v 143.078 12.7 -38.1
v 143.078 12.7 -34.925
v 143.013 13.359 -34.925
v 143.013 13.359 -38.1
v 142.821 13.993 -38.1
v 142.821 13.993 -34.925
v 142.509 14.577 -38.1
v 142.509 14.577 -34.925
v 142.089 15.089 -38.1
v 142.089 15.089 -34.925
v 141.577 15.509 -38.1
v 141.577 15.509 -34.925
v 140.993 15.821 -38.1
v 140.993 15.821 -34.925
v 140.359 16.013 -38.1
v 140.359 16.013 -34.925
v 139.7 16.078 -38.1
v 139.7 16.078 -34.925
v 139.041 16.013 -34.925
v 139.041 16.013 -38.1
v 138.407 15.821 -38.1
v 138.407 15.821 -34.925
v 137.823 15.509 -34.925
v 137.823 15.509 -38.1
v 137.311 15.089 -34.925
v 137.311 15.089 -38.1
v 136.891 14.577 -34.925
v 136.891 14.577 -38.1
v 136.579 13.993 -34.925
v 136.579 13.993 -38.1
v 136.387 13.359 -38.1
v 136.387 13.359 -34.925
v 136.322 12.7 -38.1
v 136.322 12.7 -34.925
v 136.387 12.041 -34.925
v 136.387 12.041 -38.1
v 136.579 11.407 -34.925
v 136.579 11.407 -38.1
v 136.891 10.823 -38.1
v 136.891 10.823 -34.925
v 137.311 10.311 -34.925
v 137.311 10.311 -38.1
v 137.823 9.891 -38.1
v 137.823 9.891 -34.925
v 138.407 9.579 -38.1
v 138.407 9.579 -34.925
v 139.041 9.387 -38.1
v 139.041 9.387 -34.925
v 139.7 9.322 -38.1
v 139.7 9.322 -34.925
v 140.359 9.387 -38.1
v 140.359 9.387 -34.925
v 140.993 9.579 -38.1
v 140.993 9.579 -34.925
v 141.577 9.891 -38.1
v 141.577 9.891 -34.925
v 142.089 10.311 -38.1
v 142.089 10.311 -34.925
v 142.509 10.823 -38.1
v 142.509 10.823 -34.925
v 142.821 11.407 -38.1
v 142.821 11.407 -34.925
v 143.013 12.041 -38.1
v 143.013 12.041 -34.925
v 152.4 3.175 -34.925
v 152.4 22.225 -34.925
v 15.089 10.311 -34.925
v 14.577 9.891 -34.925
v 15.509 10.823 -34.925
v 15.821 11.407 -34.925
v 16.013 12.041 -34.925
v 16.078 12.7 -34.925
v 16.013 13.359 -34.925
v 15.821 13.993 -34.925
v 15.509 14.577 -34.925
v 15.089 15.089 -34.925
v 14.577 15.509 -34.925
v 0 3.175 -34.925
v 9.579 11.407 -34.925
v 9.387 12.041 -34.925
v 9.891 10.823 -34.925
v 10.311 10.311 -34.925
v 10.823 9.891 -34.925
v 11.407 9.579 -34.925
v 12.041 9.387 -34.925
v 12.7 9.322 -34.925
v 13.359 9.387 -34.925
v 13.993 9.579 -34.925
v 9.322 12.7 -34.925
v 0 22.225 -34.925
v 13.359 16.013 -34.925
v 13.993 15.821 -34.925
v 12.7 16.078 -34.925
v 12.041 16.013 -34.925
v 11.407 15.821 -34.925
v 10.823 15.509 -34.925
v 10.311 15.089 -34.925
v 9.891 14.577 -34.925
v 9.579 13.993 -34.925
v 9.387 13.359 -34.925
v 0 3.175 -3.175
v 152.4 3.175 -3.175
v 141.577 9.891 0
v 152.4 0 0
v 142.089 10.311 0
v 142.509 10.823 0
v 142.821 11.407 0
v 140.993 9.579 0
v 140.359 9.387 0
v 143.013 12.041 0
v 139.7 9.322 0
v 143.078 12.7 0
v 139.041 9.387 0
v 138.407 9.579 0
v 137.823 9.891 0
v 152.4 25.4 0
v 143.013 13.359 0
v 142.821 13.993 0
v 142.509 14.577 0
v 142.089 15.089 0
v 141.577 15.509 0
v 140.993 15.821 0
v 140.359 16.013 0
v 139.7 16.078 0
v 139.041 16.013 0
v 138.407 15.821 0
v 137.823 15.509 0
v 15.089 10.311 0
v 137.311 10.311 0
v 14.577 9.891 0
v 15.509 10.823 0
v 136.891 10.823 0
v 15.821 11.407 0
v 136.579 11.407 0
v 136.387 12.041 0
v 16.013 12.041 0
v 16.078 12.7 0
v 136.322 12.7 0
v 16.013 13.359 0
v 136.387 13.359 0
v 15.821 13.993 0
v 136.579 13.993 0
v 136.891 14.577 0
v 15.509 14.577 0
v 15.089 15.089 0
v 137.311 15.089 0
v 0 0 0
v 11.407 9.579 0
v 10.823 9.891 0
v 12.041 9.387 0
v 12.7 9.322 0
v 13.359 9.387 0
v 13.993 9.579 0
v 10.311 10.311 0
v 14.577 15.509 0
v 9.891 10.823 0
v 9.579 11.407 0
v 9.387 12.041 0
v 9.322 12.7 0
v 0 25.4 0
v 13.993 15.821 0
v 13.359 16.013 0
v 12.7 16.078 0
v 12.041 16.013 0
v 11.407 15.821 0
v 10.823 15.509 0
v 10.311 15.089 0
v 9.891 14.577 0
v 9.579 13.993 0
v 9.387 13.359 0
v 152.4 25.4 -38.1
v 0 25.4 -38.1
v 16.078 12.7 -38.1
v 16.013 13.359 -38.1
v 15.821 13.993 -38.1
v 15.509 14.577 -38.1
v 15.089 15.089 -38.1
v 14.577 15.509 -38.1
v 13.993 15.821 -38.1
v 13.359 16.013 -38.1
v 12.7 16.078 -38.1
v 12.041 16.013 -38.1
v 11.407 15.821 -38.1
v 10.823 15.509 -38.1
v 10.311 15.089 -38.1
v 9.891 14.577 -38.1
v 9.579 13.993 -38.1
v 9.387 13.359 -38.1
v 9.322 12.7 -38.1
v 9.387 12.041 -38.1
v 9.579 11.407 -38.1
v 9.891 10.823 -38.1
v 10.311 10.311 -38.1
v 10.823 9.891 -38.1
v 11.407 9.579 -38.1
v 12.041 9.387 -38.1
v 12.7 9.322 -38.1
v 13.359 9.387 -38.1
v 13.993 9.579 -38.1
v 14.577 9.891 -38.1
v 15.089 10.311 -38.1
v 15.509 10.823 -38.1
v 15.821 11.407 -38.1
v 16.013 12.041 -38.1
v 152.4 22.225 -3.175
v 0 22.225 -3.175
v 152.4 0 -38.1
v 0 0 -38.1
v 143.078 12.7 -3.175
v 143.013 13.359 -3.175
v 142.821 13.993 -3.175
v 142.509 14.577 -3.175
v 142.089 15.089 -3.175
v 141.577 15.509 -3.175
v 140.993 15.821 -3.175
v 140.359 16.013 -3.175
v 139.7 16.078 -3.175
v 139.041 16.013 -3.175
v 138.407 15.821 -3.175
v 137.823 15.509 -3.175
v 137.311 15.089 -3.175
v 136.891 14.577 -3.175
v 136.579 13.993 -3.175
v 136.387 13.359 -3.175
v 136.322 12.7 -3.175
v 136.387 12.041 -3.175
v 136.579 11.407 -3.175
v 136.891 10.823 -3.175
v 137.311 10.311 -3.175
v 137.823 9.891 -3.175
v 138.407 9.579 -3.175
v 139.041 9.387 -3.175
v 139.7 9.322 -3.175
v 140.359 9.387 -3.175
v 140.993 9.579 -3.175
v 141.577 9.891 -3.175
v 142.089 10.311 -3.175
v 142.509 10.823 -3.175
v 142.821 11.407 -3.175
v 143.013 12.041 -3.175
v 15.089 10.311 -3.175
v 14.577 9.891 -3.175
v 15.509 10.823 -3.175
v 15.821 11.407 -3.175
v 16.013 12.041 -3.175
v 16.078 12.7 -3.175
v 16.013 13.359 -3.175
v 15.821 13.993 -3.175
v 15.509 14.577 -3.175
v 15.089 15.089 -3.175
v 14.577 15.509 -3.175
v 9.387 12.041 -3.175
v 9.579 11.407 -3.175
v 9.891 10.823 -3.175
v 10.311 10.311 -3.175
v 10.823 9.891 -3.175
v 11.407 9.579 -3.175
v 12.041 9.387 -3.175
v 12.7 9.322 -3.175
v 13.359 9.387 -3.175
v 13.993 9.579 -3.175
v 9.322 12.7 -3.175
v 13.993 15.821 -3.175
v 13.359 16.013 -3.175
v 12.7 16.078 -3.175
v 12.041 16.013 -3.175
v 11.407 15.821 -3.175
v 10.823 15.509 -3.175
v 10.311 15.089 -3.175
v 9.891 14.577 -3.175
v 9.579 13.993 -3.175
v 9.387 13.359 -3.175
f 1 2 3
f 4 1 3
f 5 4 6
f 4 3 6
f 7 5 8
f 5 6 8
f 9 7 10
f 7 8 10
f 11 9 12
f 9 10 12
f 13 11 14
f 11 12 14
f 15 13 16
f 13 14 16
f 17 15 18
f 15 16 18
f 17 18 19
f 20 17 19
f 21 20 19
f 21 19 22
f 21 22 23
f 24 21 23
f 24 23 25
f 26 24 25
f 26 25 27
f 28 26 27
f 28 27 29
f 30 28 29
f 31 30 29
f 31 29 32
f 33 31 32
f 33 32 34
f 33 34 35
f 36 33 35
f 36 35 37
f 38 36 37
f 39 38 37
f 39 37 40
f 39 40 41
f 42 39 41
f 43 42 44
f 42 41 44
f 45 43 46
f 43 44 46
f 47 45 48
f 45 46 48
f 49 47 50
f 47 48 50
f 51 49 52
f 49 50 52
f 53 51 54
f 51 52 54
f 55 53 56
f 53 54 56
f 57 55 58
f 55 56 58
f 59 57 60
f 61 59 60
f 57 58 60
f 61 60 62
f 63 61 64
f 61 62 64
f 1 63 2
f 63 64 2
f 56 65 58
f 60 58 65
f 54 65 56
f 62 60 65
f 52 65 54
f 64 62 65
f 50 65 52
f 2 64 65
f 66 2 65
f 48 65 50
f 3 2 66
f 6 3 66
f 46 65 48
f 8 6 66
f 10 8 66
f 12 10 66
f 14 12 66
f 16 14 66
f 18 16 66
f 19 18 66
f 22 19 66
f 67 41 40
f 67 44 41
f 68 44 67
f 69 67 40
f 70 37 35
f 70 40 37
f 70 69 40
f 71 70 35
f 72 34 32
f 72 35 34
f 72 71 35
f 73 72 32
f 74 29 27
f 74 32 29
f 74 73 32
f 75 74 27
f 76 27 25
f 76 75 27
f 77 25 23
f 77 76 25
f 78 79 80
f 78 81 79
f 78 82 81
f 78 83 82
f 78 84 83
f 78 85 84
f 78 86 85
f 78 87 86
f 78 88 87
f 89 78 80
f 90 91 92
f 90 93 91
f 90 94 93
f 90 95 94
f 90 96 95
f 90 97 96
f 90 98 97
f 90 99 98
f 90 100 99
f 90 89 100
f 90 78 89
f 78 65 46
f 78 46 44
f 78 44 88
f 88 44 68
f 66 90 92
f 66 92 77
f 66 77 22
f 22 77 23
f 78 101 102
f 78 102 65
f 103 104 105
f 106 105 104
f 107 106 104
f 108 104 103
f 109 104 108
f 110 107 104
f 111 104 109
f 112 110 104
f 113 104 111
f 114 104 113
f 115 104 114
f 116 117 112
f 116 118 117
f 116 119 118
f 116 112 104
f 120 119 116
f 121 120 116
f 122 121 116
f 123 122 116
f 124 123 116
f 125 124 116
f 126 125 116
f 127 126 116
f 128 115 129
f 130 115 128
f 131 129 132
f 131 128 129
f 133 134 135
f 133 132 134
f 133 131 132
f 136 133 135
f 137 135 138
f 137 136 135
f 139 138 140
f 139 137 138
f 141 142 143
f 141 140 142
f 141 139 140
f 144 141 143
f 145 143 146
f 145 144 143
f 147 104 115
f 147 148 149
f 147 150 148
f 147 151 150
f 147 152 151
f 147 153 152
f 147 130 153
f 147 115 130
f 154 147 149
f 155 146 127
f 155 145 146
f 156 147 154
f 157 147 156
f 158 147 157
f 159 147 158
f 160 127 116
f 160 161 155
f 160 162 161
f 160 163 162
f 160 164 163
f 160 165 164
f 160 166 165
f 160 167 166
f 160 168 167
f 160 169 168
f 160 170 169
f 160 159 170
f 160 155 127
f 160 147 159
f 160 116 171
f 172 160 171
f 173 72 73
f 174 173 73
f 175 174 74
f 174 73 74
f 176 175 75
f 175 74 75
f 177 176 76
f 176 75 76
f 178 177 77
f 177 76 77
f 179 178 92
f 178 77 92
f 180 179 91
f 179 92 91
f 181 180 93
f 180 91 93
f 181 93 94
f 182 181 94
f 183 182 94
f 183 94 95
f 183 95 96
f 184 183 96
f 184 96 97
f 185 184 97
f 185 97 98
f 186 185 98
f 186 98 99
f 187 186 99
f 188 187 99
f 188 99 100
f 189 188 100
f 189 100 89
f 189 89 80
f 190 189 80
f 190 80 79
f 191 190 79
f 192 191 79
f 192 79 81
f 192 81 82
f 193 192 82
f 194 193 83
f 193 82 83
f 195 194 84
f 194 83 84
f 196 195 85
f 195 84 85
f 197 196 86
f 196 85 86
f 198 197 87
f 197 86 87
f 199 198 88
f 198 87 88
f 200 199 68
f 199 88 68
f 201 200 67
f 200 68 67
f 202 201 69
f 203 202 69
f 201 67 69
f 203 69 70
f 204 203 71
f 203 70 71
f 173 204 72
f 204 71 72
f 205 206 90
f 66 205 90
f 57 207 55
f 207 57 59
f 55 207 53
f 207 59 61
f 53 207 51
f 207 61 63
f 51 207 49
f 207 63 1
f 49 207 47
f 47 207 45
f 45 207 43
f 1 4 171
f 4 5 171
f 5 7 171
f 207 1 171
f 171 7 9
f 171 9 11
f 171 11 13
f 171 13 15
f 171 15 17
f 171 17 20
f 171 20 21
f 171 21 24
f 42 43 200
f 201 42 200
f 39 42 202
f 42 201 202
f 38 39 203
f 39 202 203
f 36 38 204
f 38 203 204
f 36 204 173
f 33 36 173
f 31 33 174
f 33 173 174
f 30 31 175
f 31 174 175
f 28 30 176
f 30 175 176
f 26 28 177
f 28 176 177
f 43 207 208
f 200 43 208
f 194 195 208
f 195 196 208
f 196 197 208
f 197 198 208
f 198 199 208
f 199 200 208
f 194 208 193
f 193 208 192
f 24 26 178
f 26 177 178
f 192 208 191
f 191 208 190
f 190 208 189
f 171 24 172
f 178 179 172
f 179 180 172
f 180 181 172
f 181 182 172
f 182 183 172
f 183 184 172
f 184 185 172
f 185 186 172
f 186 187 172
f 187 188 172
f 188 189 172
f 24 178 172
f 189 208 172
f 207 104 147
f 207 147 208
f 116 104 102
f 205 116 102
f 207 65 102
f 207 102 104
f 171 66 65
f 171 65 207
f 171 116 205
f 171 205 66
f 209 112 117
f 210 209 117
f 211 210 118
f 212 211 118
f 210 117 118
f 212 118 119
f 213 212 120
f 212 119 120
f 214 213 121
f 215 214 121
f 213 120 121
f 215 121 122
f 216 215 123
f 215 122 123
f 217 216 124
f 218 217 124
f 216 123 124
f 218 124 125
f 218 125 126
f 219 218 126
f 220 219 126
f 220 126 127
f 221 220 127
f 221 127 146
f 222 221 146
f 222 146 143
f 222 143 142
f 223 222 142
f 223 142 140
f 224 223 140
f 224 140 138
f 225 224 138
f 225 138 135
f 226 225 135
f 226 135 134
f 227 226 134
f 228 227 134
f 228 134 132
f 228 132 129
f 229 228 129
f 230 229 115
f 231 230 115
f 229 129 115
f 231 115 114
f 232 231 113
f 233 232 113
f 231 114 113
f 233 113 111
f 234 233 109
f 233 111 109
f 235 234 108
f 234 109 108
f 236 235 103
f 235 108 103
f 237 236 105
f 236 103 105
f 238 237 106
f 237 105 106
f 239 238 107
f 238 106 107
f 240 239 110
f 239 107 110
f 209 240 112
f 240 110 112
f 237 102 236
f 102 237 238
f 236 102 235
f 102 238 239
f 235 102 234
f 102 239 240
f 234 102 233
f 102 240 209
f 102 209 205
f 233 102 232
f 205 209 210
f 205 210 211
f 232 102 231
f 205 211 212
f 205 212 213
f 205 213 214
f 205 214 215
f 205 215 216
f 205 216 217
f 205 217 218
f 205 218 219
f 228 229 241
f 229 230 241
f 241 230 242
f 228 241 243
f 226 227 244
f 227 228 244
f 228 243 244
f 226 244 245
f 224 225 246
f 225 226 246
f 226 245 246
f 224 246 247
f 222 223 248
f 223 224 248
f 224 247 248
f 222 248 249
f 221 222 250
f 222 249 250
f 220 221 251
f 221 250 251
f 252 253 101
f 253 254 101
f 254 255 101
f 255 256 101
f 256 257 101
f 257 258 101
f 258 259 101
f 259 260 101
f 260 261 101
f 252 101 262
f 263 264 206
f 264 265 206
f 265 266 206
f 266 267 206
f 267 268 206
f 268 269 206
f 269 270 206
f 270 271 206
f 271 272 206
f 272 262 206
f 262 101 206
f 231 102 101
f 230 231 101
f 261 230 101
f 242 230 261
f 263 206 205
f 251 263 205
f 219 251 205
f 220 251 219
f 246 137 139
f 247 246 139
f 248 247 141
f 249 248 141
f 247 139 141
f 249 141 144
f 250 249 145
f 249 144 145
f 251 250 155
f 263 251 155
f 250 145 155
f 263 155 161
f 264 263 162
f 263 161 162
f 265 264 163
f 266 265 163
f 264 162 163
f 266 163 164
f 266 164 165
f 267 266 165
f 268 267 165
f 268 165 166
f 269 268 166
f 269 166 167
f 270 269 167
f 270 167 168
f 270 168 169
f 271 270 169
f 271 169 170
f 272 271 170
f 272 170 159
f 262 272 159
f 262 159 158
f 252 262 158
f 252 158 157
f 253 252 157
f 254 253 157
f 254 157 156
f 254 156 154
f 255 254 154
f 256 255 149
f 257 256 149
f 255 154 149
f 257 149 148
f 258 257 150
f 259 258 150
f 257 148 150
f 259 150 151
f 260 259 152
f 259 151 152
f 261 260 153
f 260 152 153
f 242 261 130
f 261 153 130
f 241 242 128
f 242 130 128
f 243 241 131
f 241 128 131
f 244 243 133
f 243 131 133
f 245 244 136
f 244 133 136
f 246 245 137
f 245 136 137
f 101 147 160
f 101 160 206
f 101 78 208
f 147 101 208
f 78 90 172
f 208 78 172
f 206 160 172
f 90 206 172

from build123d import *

# Parameters (mm, degrees)
SKETCH1_W           = 38.1
SKETCH1_H           = 25.4
SKETCH1_W_2         = 31.75
SKETCH1_H_2         = 19.05
EXTRUDE_THIN1_DEPTH = 152.4
SKETCH2_R           = 3.3782
CUT_EXTRUDE1_DEPTH  = 160.130543894


with BuildPart() as part:
    # Sketch1 → Extrude-Thin1 (new body)
    with BuildSketch(Plane(origin=(0, 0, 0), x_dir=(0, 0, -1), z_dir=(1, 0, 0))):
        with Locations((19.05, 12.7)):
            Rectangle(SKETCH1_W, SKETCH1_H)
        with Locations((19.05, 12.7)):
            Rectangle(SKETCH1_W_2, SKETCH1_H_2, mode=Mode.SUBTRACT)
    extrude(amount=EXTRUDE_THIN1_DEPTH)

    # Sketch2 → Cut-Extrude1 (cut, through all)
    with BuildSketch(Plane.XY):
        with Locations((12.7, 12.7)):
            Circle(SKETCH2_R)
        with Locations((139.7, 12.7)):
            Circle(SKETCH2_R)
    extrude(amount=-CUT_EXTRUDE1_DEPTH, mode=Mode.SUBTRACT)


solid = part.part
